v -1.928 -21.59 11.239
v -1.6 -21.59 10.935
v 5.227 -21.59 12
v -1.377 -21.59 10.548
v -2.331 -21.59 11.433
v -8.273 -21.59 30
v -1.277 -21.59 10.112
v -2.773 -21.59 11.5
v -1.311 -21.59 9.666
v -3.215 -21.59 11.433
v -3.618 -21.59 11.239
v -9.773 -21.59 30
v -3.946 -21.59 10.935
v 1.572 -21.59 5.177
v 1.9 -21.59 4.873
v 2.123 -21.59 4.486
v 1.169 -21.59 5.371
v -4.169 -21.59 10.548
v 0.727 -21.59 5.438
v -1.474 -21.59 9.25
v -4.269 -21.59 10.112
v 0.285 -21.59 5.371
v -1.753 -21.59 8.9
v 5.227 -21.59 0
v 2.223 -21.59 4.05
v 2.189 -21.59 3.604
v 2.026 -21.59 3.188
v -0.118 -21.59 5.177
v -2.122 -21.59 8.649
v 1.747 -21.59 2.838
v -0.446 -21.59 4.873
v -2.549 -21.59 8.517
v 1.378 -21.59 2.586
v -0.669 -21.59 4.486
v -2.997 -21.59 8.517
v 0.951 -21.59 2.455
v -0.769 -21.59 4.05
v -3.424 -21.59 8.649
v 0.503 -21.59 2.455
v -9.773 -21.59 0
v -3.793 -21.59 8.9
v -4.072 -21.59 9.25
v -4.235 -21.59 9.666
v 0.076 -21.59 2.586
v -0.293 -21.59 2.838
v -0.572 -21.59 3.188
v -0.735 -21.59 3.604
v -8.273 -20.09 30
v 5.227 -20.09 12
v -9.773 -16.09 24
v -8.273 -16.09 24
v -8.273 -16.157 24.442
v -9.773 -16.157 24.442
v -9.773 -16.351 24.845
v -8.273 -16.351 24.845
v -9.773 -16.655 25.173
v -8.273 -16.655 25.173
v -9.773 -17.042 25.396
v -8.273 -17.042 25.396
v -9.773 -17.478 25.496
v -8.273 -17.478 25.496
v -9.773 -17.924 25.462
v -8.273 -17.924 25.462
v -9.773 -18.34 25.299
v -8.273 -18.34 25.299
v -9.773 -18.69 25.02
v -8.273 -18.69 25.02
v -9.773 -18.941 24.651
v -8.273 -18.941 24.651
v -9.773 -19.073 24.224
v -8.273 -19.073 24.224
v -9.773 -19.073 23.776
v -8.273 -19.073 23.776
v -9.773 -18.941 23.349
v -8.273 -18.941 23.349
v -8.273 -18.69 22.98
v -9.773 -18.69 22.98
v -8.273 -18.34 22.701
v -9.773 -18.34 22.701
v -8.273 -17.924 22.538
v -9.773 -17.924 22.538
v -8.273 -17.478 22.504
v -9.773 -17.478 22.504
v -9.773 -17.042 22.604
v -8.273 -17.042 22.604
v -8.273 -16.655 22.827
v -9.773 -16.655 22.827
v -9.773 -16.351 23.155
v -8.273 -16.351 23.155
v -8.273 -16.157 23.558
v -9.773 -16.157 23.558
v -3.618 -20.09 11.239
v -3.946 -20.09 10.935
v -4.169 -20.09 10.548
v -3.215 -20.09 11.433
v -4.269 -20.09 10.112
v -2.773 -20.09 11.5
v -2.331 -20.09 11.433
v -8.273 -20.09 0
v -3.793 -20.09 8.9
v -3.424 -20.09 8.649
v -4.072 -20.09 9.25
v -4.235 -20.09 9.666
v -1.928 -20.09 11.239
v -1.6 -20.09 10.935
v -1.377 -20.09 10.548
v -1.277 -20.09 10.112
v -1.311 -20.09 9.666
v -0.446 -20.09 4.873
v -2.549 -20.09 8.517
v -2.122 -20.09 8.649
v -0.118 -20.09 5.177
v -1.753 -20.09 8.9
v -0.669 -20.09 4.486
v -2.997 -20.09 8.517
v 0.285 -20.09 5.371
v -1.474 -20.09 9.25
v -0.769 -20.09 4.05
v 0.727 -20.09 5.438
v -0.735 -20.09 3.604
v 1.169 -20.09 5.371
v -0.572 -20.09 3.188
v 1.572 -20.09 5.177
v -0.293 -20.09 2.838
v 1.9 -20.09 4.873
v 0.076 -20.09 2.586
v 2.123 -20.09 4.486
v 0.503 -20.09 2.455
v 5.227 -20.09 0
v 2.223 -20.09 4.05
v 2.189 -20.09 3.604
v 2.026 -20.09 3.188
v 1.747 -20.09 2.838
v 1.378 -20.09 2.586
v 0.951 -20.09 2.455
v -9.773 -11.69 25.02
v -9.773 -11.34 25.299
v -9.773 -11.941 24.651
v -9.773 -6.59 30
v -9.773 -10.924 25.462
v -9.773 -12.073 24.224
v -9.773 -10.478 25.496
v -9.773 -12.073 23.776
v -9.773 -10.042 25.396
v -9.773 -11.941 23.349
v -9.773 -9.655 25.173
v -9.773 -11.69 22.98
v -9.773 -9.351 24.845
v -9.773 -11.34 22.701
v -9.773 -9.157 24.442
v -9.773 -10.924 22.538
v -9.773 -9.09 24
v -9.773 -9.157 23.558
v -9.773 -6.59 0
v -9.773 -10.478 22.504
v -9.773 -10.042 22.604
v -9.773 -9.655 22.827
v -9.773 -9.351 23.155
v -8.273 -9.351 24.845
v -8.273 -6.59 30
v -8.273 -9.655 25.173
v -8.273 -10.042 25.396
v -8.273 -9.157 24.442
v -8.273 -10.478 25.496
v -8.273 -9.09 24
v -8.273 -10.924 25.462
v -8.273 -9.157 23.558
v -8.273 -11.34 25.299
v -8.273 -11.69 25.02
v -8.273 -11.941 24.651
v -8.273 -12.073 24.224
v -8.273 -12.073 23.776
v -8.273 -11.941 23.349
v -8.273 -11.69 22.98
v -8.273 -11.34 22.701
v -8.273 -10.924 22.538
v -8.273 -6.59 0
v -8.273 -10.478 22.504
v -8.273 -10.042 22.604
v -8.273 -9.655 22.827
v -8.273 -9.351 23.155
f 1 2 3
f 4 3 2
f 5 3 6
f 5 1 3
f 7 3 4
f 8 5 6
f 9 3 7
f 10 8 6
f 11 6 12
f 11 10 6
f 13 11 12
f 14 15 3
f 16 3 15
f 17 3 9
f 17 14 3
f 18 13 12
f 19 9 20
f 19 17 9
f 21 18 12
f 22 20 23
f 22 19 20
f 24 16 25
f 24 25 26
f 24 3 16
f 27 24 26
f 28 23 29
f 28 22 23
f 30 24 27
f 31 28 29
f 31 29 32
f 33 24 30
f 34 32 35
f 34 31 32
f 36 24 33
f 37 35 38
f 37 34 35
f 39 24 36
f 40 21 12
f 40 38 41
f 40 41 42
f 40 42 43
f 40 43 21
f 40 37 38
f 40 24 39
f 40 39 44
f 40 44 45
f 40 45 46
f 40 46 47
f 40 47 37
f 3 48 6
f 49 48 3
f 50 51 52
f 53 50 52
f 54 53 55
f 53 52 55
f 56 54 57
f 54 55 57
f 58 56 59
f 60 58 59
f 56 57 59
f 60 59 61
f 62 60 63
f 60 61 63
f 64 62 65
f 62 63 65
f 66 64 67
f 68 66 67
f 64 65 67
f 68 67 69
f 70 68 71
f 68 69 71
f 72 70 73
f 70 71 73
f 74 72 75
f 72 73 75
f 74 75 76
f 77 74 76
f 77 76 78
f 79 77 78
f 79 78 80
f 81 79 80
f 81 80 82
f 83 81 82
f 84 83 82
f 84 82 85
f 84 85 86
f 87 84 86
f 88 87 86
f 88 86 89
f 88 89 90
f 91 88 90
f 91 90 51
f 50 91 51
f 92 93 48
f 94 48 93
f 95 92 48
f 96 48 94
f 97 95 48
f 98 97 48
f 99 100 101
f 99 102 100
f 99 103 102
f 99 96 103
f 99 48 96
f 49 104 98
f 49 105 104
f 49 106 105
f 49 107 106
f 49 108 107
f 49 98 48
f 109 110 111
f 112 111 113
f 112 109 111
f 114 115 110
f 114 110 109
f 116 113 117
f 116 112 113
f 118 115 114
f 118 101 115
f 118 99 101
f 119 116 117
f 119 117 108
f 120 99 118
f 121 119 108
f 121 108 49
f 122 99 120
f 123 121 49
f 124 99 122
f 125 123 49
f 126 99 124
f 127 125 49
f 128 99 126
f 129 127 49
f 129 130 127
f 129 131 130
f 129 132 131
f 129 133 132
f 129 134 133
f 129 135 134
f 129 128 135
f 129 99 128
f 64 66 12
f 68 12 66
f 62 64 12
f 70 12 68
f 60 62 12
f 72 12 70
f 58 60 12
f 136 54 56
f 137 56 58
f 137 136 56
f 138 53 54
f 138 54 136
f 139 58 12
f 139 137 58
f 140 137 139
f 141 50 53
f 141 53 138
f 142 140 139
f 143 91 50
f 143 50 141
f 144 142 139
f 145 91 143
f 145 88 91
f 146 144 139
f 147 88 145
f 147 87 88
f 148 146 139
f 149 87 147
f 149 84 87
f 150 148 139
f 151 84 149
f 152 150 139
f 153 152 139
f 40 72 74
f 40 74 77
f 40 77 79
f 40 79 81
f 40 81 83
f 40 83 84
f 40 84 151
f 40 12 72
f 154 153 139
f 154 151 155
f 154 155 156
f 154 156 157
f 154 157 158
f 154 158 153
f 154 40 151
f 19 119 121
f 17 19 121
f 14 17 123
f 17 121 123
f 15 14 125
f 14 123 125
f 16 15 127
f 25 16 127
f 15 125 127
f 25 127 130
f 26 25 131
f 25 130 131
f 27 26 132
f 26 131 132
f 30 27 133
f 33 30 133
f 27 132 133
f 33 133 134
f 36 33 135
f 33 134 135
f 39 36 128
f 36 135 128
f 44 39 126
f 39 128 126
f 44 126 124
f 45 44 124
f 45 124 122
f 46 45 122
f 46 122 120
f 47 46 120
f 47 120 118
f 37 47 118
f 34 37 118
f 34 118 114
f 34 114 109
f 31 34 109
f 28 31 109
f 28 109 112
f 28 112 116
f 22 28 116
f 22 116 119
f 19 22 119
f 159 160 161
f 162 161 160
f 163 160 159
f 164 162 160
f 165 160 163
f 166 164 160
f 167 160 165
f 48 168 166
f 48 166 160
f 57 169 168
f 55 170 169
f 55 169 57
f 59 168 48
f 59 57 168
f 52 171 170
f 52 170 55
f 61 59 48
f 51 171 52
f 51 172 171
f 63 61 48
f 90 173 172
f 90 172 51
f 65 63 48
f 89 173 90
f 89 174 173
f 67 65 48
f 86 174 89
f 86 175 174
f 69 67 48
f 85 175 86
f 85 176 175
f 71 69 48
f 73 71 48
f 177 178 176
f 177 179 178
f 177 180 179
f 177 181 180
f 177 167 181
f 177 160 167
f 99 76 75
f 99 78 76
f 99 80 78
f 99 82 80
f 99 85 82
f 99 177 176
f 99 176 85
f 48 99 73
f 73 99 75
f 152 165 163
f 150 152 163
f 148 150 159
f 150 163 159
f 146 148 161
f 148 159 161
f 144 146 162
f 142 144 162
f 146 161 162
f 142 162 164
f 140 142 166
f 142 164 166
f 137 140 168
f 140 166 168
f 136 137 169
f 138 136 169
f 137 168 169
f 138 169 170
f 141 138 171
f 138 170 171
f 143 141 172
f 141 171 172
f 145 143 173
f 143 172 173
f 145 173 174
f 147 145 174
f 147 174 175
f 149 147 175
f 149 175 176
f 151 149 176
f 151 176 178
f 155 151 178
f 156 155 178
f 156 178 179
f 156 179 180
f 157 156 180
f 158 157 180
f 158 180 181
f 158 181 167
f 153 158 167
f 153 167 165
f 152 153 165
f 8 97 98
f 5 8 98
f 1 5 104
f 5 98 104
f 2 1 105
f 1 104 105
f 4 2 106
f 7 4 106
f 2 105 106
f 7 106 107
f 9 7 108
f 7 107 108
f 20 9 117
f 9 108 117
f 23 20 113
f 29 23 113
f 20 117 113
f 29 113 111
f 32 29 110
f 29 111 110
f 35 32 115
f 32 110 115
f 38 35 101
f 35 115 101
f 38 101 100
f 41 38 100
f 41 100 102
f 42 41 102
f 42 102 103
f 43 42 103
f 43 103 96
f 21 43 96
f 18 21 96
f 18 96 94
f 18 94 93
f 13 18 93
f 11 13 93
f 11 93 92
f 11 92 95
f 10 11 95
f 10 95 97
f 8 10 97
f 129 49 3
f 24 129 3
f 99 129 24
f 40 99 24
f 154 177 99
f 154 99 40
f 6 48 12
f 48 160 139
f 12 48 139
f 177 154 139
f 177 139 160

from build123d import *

# Parameters (mm, degrees)
EXTRUSION1_DEPTH = 30
ESQUISSE3_R      = 1.5
EXTRUSION2_DEPTH = 60
ESQUISSE4_R      = 1.5
EXTRUSION3_DEPTH = 60


with BuildPart() as part:
    # Esquisse1 → Extrusion1 (new body)
    with BuildSketch(Plane.XY):
        Polygon((-9.773002169, -6.59), (-8.273002169, -6.59), (-8.273002169, -20.09), (5.226997831, -20.09), (5.226997831, -21.59), (-9.773002169, -21.59), align=None)
    extrude(amount=EXTRUSION1_DEPTH)

    # Esquisse3 → Extrusion2 (cut)
    with BuildSketch(Plane(origin=(-8.273002169, 0, 0), x_dir=(0, 0, -1), z_dir=(1, 0, 0))):
        with Locations(Location((-24, -10.59, 0), (0, 0, 90))):
            Circle(ESQUISSE3_R)
        with Locations(Location((-24, -17.59, 0), (0, 0, 90))):
            Circle(ESQUISSE3_R)
    extrude(amount=-EXTRUSION2_DEPTH, mode=Mode.SUBTRACT)

    # Esquisse4 → Extrusion3 (cut)
    with BuildSketch(Plane(origin=(0, -20.09, 0), x_dir=(-1, 0, 0), z_dir=(0, 1, 0))):
        with Locations(Location((2.773002169, 10, 0), (0, 0, 90))):
            Circle(ESQUISSE4_R)
        with Locations(Location((-0.726997831, 3.937822174, 0), (0, 0, 90))):
            Circle(ESQUISSE4_R)
        Polygon((-5.226997831, 30), (8.273002169, 30), (-5.226997831, 12), align=None)
    extrude(amount=-EXTRUSION3_DEPTH, mode=Mode.SUBTRACT)


solid = part.part
